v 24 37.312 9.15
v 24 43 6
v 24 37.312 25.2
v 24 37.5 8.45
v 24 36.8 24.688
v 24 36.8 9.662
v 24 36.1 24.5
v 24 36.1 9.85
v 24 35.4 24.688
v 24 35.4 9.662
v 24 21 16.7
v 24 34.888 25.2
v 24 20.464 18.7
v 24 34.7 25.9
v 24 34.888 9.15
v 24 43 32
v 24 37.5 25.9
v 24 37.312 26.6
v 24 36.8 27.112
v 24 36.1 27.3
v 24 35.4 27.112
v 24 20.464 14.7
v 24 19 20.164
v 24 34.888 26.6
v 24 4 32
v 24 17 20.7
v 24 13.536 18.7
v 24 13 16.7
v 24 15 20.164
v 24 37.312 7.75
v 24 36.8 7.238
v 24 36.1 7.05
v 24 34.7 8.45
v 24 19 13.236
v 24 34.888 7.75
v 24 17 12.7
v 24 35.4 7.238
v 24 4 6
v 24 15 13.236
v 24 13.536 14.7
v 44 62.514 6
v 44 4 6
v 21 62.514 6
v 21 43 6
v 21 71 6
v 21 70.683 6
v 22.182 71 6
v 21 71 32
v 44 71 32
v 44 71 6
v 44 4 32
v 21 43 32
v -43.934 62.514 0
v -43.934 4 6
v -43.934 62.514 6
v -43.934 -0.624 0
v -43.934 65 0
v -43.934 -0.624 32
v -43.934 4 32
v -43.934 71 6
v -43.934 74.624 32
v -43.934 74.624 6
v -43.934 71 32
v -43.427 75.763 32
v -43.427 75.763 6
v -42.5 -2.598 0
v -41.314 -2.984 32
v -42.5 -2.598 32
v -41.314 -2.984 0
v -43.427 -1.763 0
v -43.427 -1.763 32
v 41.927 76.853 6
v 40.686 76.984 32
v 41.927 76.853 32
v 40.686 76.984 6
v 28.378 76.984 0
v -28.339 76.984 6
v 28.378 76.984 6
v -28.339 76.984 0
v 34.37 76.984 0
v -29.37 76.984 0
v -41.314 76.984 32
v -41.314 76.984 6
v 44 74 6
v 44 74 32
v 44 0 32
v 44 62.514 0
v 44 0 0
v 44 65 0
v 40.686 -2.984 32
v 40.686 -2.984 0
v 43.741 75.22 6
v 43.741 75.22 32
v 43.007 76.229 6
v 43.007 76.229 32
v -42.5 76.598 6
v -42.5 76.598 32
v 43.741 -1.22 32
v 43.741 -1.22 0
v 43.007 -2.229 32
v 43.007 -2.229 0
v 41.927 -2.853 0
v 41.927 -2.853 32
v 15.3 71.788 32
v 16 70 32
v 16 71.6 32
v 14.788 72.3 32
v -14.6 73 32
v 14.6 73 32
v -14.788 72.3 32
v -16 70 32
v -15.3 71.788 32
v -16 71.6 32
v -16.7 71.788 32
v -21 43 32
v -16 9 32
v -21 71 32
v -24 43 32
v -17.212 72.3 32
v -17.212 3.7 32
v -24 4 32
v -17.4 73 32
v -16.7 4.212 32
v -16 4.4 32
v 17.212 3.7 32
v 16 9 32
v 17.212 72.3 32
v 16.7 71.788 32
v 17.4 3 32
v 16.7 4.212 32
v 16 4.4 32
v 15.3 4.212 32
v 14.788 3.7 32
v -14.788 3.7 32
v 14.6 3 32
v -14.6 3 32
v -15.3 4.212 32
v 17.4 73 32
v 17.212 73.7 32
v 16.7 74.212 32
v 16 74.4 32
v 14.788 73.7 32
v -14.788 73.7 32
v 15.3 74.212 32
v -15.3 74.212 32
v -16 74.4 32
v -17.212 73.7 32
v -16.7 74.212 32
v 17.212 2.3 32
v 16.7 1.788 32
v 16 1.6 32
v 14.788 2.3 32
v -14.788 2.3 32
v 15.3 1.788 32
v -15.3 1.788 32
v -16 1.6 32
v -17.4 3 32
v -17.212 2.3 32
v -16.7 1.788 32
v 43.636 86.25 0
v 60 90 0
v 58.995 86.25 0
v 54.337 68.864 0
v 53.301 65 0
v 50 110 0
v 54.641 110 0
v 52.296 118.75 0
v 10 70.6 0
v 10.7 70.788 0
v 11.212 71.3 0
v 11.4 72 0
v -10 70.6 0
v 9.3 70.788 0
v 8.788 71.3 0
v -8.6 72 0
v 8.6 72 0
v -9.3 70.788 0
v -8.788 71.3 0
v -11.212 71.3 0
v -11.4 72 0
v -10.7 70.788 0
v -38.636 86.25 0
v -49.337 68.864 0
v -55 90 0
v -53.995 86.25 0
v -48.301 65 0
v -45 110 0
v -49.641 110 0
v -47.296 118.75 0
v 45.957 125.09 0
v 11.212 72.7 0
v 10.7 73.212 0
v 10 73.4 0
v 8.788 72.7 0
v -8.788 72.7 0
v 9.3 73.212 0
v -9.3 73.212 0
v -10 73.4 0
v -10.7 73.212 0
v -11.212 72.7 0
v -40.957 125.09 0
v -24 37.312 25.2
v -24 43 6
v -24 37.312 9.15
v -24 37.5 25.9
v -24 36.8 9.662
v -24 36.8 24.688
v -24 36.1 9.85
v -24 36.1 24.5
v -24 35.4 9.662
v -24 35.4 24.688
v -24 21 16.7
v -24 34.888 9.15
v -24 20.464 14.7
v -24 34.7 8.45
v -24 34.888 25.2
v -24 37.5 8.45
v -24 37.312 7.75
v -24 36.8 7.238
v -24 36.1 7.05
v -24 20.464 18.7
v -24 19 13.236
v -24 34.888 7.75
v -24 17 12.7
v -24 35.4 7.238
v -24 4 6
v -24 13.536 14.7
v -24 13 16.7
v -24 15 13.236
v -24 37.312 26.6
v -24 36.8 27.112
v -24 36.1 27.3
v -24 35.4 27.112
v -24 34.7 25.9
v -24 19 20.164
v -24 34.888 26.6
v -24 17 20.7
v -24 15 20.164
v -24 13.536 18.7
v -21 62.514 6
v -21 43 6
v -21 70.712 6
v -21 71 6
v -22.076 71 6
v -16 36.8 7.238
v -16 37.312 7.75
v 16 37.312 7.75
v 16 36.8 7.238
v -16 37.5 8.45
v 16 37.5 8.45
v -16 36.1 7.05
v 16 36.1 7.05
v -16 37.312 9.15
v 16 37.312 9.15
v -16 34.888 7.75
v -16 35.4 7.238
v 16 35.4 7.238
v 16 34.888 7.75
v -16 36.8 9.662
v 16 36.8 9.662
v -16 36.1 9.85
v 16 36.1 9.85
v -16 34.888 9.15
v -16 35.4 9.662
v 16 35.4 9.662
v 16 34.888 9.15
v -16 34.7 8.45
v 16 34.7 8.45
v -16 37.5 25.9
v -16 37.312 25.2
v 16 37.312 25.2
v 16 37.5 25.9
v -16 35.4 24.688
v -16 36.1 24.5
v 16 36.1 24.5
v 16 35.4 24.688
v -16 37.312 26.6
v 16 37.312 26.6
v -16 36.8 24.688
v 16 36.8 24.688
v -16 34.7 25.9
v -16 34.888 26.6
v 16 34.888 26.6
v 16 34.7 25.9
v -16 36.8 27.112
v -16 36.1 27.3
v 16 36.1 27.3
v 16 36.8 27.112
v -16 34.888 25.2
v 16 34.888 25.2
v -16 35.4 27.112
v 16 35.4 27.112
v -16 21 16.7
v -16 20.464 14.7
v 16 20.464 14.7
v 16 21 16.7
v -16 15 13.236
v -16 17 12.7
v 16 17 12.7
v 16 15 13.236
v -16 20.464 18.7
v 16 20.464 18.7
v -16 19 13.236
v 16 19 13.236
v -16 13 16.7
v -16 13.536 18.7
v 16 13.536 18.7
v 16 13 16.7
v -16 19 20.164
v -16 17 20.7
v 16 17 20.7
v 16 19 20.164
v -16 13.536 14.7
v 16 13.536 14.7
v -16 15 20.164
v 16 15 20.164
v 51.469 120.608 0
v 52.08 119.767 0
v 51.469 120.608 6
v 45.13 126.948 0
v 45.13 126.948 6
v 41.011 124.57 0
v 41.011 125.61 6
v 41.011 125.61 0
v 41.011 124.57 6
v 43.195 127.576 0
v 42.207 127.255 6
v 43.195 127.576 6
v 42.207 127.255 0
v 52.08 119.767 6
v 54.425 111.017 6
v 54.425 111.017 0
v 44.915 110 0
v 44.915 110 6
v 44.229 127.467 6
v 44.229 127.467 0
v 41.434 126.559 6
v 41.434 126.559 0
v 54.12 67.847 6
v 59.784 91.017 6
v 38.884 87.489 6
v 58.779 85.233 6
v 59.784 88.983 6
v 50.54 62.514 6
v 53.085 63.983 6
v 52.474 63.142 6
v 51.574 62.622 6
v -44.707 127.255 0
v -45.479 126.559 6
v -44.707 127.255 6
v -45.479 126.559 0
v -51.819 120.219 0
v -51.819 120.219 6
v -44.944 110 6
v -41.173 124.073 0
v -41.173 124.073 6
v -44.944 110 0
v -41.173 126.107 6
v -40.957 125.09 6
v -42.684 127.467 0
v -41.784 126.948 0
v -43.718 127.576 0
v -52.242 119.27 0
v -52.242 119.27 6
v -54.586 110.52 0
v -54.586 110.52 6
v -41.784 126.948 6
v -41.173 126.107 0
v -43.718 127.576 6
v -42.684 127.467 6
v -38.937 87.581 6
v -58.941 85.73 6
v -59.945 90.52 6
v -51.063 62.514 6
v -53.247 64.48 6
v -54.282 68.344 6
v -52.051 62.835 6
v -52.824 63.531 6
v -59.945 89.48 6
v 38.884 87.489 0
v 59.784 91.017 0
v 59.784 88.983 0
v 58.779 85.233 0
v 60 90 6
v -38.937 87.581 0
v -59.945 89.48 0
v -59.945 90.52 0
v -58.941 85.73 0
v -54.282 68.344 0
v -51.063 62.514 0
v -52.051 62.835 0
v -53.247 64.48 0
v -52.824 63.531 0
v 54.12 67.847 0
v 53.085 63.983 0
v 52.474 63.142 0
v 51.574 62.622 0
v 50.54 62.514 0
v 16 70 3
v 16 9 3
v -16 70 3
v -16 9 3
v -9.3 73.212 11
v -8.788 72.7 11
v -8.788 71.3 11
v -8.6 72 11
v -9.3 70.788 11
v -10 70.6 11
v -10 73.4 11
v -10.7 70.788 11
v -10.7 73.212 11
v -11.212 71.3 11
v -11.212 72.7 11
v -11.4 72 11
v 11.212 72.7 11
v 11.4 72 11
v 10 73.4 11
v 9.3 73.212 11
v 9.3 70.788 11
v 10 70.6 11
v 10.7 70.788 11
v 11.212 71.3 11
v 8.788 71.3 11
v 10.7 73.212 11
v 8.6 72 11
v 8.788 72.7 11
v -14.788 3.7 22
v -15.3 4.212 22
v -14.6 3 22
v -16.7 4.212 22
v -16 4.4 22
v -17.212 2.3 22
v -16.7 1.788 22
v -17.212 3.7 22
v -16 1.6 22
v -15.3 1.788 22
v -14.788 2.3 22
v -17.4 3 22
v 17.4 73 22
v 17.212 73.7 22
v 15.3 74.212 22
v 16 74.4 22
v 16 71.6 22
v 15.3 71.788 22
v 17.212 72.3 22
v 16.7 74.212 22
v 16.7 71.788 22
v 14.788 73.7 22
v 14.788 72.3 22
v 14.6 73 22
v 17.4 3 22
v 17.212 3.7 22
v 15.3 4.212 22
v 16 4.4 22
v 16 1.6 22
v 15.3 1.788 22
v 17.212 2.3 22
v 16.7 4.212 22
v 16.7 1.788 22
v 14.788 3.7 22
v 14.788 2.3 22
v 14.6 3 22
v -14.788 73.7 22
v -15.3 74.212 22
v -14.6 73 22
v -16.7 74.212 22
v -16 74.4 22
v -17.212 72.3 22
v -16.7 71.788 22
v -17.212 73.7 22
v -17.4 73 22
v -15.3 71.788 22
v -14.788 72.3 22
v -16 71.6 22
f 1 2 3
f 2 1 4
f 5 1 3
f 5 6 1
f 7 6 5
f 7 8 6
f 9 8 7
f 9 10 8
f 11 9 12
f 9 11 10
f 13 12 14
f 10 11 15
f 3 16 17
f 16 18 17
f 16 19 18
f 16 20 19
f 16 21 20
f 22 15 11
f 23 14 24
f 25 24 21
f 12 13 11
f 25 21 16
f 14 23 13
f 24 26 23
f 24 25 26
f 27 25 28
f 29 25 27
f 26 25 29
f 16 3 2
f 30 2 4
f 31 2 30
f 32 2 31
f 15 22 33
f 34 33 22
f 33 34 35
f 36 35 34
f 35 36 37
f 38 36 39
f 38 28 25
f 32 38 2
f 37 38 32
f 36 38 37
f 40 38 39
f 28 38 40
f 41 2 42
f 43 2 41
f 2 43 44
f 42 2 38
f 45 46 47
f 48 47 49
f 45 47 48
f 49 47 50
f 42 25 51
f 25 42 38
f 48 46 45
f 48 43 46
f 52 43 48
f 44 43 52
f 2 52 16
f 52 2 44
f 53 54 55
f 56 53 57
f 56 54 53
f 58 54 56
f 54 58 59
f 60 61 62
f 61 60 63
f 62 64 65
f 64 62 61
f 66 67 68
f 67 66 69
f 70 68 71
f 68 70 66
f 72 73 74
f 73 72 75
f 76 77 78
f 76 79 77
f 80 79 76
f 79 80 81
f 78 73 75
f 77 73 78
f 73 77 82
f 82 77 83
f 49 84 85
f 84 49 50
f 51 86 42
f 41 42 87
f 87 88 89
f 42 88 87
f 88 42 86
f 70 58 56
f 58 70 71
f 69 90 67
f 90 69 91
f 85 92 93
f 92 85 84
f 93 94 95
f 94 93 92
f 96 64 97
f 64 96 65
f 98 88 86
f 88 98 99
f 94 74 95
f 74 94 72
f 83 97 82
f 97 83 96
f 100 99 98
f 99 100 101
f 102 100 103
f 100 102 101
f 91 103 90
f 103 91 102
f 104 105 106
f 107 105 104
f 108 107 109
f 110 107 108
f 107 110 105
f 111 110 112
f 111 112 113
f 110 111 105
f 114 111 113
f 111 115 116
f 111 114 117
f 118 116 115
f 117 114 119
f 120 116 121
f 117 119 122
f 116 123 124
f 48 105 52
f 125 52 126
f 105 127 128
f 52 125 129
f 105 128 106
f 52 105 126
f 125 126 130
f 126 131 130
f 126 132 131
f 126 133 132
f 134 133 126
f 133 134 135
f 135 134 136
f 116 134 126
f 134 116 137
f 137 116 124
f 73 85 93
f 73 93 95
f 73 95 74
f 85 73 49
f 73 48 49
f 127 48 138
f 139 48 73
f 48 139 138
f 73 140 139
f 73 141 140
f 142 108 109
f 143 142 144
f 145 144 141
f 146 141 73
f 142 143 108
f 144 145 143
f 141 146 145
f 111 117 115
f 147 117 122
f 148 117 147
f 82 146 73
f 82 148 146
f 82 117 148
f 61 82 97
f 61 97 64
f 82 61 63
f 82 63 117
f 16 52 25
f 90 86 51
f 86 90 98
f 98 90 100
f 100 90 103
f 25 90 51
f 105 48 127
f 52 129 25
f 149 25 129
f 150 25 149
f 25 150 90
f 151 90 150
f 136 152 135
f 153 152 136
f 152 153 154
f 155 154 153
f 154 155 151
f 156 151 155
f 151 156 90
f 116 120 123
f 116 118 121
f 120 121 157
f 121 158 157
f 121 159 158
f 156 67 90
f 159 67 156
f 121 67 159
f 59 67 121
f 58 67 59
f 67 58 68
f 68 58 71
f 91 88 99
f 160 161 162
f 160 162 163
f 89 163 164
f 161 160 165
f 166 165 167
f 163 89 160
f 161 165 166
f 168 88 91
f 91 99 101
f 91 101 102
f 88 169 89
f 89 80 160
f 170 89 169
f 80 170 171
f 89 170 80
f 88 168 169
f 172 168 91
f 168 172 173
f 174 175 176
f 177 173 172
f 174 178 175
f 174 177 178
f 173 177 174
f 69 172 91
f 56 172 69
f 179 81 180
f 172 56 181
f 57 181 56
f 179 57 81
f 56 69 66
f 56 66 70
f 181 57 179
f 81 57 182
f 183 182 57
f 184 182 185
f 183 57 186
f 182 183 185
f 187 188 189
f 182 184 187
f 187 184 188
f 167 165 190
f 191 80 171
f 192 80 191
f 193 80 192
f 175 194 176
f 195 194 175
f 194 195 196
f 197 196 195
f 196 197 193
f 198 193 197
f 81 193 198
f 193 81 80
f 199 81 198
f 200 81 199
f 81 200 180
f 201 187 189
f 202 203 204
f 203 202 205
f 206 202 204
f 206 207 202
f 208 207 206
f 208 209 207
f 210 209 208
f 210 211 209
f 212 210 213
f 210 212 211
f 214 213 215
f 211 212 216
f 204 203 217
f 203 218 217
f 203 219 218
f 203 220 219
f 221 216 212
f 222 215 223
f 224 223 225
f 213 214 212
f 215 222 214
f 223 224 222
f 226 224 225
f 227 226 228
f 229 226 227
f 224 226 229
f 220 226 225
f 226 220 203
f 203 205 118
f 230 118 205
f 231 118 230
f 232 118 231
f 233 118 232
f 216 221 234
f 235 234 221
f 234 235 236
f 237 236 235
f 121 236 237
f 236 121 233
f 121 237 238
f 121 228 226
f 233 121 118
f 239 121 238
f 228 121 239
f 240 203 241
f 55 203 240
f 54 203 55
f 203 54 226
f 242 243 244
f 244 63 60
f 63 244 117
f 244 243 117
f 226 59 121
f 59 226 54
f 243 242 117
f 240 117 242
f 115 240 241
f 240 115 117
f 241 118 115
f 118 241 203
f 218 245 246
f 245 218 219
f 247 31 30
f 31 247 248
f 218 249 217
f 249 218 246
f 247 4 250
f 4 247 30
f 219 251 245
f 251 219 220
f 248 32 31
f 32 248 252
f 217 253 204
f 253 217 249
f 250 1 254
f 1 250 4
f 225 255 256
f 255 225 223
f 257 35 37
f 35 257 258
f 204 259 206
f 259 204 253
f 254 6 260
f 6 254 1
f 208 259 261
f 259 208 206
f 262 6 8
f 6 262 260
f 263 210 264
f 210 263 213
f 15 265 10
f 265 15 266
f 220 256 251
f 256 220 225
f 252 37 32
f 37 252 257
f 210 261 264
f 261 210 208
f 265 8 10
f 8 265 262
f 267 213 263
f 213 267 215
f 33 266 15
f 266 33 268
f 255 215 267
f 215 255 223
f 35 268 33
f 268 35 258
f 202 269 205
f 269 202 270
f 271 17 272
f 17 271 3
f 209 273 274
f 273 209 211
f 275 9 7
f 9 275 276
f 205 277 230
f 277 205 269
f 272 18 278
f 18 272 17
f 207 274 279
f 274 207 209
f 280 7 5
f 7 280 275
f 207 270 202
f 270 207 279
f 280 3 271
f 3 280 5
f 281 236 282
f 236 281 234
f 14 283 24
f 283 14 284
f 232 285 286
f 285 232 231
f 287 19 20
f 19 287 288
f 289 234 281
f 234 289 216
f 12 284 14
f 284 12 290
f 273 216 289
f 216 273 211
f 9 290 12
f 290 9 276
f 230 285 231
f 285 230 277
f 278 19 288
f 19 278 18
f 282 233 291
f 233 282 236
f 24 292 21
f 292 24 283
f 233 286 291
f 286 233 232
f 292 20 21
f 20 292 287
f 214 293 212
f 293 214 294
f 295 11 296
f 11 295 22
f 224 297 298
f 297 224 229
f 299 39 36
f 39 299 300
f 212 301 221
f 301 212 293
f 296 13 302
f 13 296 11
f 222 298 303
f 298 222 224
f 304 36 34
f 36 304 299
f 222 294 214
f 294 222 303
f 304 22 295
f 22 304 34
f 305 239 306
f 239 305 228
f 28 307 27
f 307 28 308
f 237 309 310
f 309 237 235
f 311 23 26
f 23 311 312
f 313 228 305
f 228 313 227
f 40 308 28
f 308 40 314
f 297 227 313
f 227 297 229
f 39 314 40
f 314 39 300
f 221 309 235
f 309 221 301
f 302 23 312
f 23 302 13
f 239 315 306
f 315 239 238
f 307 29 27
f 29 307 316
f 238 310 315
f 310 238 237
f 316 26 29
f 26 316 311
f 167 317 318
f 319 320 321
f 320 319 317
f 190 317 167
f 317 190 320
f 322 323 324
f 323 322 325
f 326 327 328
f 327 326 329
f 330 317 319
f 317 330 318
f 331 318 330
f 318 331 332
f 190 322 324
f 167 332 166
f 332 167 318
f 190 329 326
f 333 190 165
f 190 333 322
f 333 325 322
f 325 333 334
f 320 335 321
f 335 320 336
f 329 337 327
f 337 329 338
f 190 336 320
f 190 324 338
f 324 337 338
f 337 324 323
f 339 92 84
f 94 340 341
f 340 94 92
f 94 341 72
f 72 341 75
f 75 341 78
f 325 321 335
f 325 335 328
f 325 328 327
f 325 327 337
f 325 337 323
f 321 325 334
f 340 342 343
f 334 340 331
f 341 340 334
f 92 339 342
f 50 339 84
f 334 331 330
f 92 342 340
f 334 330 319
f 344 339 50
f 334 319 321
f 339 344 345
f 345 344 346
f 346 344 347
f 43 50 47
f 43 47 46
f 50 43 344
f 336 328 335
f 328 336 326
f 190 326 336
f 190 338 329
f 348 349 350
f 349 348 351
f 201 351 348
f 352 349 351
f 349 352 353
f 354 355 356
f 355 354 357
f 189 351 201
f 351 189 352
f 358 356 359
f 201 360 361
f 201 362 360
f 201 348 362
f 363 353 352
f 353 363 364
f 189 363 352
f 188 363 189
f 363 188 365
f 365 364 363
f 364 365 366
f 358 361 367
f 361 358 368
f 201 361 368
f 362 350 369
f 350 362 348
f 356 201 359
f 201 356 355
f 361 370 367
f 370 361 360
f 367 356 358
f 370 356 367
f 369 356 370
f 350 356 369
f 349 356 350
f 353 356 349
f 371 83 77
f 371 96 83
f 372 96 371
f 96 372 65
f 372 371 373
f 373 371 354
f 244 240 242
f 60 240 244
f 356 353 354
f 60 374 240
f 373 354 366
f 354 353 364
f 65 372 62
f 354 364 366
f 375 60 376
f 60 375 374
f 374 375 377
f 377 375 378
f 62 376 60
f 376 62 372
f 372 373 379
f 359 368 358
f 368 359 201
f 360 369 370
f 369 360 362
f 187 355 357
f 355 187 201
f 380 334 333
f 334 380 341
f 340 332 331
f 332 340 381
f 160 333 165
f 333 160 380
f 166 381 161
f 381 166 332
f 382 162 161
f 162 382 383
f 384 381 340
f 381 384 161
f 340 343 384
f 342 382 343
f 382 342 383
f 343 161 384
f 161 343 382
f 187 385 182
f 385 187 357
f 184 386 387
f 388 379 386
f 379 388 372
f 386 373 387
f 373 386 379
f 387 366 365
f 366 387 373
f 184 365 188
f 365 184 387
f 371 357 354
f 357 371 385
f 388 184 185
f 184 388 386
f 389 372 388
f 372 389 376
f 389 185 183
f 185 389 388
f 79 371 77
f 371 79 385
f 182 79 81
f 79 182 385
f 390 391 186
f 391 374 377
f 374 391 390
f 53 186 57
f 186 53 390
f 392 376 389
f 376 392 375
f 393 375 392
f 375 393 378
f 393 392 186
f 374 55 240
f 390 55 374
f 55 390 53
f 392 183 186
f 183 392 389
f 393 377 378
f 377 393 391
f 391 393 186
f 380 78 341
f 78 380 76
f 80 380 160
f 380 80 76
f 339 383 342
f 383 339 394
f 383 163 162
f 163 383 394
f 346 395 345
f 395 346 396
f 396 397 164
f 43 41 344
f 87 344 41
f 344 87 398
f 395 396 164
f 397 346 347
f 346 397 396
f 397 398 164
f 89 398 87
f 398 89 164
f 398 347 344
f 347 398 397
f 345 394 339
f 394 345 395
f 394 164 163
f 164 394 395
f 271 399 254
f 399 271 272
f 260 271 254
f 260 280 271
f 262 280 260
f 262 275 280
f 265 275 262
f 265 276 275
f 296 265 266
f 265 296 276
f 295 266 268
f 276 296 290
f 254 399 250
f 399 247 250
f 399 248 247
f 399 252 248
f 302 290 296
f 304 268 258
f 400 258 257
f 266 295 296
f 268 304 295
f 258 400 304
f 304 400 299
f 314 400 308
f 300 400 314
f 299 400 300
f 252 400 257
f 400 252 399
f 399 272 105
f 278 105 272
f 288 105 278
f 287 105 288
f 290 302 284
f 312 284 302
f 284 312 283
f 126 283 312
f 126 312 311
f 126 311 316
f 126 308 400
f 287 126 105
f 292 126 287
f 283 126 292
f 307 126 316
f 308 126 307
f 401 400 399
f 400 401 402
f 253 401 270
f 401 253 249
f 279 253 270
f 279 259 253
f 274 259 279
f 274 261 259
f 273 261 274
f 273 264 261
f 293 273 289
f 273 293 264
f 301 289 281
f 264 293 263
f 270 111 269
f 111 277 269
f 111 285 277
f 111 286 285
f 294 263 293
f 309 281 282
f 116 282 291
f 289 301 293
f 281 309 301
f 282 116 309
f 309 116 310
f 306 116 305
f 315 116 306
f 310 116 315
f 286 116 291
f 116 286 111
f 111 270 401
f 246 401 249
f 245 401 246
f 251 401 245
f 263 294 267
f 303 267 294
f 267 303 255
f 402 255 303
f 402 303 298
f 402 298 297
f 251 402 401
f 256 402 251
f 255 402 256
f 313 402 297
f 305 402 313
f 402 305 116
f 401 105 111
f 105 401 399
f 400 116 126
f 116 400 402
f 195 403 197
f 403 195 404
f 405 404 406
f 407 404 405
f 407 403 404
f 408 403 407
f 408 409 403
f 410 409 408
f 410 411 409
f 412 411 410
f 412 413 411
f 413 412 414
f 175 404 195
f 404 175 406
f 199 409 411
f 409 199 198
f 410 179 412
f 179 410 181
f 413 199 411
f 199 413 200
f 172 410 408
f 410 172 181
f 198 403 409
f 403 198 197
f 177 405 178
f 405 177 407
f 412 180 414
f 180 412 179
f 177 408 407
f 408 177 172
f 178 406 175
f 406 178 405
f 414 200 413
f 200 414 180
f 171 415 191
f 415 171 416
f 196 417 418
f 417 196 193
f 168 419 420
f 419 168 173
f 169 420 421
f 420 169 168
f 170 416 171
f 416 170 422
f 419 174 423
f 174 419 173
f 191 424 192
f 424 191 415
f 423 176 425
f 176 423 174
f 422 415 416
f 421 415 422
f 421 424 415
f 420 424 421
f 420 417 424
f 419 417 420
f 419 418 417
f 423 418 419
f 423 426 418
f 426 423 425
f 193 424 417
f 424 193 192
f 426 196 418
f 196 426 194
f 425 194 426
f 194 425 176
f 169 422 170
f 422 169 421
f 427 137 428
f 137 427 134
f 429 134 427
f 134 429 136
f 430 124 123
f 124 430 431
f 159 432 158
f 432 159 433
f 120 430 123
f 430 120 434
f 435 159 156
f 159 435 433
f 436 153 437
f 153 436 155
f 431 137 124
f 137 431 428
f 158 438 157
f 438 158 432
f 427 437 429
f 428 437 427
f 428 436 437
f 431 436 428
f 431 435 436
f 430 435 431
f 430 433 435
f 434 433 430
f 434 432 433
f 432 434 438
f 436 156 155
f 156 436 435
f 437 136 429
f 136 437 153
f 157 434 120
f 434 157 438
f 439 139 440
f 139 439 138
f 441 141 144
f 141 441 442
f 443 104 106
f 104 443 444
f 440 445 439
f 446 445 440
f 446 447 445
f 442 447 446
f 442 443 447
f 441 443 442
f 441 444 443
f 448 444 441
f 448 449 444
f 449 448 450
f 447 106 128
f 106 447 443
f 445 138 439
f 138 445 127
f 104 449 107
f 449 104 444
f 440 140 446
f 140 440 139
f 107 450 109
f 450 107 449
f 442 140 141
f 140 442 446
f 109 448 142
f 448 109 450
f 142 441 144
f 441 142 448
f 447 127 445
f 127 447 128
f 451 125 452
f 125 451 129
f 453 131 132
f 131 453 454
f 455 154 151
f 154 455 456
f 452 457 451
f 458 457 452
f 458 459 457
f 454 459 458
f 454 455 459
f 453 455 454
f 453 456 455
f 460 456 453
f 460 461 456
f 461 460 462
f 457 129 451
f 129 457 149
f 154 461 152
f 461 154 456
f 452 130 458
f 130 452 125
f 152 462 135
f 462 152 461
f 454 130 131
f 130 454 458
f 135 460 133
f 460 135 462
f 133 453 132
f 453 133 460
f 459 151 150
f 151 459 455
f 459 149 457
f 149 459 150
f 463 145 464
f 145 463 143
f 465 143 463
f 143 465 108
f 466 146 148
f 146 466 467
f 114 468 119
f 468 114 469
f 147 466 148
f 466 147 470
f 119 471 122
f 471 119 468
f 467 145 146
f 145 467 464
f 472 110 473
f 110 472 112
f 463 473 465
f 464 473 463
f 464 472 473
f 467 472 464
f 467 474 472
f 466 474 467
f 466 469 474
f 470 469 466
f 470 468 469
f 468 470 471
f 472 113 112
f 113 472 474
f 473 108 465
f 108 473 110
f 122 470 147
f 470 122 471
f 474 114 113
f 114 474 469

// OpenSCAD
difference(){

union(){

difference(){
minkowski(){
translate([-41,0,0])cube([82,74,32]);
cylinder(d=6,h=0.00001,$fn=15);
}
translate([-45,4,6])cube([21,67,30]);
translate([-42,43,6])cube([21,28,30]);
mirror([-1,0,0]){
translate([-45,4,6])cube([21,67,30]);
translate([-42,43,6])cube([21,28,30]);
}
translate([0,36.1,2.45+6])rotate([0,90,0])
cylinder(d=2.8,h=100,center=true,$fn=12);
translate([0,36.1,19.9+6])rotate([0,90,0])
cylinder(d=2.8,h=100,center=true,$fn=12);
translate([0,17,10.7+6])rotate([0,90,0])
cylinder(d=8,h=100,center=true,$fn=12);   
}

minkowski(){
difference(){
translate([0,90,0])cylinder(d=115,h=6,$fn=12);
translate([0,110,0])cylinder(d=95,h=6,$fn=12);
translate([-60,0,0])cube([120,65,10]);
}
cylinder(d=5,h=0.000001,$fn=15);
}

}
translate([-16,9,3])cube([32,61,30]);

translate([-10,72,0])cylinder(d=2.8,h=11,$fn=12);
translate([10,72,0])cylinder(d=2.8,h=11,$fn=12);

translate([-16,3,22])cylinder(d=2.8,h=11,$fn=12);
translate([16,73,22])cylinder(d=2.8,h=11,$fn=12);
translate([16,3,22])cylinder(d=2.8,h=11,$fn=12);
translate([-16,73,22])cylinder(d=2.8,h=11,$fn=12);
}
